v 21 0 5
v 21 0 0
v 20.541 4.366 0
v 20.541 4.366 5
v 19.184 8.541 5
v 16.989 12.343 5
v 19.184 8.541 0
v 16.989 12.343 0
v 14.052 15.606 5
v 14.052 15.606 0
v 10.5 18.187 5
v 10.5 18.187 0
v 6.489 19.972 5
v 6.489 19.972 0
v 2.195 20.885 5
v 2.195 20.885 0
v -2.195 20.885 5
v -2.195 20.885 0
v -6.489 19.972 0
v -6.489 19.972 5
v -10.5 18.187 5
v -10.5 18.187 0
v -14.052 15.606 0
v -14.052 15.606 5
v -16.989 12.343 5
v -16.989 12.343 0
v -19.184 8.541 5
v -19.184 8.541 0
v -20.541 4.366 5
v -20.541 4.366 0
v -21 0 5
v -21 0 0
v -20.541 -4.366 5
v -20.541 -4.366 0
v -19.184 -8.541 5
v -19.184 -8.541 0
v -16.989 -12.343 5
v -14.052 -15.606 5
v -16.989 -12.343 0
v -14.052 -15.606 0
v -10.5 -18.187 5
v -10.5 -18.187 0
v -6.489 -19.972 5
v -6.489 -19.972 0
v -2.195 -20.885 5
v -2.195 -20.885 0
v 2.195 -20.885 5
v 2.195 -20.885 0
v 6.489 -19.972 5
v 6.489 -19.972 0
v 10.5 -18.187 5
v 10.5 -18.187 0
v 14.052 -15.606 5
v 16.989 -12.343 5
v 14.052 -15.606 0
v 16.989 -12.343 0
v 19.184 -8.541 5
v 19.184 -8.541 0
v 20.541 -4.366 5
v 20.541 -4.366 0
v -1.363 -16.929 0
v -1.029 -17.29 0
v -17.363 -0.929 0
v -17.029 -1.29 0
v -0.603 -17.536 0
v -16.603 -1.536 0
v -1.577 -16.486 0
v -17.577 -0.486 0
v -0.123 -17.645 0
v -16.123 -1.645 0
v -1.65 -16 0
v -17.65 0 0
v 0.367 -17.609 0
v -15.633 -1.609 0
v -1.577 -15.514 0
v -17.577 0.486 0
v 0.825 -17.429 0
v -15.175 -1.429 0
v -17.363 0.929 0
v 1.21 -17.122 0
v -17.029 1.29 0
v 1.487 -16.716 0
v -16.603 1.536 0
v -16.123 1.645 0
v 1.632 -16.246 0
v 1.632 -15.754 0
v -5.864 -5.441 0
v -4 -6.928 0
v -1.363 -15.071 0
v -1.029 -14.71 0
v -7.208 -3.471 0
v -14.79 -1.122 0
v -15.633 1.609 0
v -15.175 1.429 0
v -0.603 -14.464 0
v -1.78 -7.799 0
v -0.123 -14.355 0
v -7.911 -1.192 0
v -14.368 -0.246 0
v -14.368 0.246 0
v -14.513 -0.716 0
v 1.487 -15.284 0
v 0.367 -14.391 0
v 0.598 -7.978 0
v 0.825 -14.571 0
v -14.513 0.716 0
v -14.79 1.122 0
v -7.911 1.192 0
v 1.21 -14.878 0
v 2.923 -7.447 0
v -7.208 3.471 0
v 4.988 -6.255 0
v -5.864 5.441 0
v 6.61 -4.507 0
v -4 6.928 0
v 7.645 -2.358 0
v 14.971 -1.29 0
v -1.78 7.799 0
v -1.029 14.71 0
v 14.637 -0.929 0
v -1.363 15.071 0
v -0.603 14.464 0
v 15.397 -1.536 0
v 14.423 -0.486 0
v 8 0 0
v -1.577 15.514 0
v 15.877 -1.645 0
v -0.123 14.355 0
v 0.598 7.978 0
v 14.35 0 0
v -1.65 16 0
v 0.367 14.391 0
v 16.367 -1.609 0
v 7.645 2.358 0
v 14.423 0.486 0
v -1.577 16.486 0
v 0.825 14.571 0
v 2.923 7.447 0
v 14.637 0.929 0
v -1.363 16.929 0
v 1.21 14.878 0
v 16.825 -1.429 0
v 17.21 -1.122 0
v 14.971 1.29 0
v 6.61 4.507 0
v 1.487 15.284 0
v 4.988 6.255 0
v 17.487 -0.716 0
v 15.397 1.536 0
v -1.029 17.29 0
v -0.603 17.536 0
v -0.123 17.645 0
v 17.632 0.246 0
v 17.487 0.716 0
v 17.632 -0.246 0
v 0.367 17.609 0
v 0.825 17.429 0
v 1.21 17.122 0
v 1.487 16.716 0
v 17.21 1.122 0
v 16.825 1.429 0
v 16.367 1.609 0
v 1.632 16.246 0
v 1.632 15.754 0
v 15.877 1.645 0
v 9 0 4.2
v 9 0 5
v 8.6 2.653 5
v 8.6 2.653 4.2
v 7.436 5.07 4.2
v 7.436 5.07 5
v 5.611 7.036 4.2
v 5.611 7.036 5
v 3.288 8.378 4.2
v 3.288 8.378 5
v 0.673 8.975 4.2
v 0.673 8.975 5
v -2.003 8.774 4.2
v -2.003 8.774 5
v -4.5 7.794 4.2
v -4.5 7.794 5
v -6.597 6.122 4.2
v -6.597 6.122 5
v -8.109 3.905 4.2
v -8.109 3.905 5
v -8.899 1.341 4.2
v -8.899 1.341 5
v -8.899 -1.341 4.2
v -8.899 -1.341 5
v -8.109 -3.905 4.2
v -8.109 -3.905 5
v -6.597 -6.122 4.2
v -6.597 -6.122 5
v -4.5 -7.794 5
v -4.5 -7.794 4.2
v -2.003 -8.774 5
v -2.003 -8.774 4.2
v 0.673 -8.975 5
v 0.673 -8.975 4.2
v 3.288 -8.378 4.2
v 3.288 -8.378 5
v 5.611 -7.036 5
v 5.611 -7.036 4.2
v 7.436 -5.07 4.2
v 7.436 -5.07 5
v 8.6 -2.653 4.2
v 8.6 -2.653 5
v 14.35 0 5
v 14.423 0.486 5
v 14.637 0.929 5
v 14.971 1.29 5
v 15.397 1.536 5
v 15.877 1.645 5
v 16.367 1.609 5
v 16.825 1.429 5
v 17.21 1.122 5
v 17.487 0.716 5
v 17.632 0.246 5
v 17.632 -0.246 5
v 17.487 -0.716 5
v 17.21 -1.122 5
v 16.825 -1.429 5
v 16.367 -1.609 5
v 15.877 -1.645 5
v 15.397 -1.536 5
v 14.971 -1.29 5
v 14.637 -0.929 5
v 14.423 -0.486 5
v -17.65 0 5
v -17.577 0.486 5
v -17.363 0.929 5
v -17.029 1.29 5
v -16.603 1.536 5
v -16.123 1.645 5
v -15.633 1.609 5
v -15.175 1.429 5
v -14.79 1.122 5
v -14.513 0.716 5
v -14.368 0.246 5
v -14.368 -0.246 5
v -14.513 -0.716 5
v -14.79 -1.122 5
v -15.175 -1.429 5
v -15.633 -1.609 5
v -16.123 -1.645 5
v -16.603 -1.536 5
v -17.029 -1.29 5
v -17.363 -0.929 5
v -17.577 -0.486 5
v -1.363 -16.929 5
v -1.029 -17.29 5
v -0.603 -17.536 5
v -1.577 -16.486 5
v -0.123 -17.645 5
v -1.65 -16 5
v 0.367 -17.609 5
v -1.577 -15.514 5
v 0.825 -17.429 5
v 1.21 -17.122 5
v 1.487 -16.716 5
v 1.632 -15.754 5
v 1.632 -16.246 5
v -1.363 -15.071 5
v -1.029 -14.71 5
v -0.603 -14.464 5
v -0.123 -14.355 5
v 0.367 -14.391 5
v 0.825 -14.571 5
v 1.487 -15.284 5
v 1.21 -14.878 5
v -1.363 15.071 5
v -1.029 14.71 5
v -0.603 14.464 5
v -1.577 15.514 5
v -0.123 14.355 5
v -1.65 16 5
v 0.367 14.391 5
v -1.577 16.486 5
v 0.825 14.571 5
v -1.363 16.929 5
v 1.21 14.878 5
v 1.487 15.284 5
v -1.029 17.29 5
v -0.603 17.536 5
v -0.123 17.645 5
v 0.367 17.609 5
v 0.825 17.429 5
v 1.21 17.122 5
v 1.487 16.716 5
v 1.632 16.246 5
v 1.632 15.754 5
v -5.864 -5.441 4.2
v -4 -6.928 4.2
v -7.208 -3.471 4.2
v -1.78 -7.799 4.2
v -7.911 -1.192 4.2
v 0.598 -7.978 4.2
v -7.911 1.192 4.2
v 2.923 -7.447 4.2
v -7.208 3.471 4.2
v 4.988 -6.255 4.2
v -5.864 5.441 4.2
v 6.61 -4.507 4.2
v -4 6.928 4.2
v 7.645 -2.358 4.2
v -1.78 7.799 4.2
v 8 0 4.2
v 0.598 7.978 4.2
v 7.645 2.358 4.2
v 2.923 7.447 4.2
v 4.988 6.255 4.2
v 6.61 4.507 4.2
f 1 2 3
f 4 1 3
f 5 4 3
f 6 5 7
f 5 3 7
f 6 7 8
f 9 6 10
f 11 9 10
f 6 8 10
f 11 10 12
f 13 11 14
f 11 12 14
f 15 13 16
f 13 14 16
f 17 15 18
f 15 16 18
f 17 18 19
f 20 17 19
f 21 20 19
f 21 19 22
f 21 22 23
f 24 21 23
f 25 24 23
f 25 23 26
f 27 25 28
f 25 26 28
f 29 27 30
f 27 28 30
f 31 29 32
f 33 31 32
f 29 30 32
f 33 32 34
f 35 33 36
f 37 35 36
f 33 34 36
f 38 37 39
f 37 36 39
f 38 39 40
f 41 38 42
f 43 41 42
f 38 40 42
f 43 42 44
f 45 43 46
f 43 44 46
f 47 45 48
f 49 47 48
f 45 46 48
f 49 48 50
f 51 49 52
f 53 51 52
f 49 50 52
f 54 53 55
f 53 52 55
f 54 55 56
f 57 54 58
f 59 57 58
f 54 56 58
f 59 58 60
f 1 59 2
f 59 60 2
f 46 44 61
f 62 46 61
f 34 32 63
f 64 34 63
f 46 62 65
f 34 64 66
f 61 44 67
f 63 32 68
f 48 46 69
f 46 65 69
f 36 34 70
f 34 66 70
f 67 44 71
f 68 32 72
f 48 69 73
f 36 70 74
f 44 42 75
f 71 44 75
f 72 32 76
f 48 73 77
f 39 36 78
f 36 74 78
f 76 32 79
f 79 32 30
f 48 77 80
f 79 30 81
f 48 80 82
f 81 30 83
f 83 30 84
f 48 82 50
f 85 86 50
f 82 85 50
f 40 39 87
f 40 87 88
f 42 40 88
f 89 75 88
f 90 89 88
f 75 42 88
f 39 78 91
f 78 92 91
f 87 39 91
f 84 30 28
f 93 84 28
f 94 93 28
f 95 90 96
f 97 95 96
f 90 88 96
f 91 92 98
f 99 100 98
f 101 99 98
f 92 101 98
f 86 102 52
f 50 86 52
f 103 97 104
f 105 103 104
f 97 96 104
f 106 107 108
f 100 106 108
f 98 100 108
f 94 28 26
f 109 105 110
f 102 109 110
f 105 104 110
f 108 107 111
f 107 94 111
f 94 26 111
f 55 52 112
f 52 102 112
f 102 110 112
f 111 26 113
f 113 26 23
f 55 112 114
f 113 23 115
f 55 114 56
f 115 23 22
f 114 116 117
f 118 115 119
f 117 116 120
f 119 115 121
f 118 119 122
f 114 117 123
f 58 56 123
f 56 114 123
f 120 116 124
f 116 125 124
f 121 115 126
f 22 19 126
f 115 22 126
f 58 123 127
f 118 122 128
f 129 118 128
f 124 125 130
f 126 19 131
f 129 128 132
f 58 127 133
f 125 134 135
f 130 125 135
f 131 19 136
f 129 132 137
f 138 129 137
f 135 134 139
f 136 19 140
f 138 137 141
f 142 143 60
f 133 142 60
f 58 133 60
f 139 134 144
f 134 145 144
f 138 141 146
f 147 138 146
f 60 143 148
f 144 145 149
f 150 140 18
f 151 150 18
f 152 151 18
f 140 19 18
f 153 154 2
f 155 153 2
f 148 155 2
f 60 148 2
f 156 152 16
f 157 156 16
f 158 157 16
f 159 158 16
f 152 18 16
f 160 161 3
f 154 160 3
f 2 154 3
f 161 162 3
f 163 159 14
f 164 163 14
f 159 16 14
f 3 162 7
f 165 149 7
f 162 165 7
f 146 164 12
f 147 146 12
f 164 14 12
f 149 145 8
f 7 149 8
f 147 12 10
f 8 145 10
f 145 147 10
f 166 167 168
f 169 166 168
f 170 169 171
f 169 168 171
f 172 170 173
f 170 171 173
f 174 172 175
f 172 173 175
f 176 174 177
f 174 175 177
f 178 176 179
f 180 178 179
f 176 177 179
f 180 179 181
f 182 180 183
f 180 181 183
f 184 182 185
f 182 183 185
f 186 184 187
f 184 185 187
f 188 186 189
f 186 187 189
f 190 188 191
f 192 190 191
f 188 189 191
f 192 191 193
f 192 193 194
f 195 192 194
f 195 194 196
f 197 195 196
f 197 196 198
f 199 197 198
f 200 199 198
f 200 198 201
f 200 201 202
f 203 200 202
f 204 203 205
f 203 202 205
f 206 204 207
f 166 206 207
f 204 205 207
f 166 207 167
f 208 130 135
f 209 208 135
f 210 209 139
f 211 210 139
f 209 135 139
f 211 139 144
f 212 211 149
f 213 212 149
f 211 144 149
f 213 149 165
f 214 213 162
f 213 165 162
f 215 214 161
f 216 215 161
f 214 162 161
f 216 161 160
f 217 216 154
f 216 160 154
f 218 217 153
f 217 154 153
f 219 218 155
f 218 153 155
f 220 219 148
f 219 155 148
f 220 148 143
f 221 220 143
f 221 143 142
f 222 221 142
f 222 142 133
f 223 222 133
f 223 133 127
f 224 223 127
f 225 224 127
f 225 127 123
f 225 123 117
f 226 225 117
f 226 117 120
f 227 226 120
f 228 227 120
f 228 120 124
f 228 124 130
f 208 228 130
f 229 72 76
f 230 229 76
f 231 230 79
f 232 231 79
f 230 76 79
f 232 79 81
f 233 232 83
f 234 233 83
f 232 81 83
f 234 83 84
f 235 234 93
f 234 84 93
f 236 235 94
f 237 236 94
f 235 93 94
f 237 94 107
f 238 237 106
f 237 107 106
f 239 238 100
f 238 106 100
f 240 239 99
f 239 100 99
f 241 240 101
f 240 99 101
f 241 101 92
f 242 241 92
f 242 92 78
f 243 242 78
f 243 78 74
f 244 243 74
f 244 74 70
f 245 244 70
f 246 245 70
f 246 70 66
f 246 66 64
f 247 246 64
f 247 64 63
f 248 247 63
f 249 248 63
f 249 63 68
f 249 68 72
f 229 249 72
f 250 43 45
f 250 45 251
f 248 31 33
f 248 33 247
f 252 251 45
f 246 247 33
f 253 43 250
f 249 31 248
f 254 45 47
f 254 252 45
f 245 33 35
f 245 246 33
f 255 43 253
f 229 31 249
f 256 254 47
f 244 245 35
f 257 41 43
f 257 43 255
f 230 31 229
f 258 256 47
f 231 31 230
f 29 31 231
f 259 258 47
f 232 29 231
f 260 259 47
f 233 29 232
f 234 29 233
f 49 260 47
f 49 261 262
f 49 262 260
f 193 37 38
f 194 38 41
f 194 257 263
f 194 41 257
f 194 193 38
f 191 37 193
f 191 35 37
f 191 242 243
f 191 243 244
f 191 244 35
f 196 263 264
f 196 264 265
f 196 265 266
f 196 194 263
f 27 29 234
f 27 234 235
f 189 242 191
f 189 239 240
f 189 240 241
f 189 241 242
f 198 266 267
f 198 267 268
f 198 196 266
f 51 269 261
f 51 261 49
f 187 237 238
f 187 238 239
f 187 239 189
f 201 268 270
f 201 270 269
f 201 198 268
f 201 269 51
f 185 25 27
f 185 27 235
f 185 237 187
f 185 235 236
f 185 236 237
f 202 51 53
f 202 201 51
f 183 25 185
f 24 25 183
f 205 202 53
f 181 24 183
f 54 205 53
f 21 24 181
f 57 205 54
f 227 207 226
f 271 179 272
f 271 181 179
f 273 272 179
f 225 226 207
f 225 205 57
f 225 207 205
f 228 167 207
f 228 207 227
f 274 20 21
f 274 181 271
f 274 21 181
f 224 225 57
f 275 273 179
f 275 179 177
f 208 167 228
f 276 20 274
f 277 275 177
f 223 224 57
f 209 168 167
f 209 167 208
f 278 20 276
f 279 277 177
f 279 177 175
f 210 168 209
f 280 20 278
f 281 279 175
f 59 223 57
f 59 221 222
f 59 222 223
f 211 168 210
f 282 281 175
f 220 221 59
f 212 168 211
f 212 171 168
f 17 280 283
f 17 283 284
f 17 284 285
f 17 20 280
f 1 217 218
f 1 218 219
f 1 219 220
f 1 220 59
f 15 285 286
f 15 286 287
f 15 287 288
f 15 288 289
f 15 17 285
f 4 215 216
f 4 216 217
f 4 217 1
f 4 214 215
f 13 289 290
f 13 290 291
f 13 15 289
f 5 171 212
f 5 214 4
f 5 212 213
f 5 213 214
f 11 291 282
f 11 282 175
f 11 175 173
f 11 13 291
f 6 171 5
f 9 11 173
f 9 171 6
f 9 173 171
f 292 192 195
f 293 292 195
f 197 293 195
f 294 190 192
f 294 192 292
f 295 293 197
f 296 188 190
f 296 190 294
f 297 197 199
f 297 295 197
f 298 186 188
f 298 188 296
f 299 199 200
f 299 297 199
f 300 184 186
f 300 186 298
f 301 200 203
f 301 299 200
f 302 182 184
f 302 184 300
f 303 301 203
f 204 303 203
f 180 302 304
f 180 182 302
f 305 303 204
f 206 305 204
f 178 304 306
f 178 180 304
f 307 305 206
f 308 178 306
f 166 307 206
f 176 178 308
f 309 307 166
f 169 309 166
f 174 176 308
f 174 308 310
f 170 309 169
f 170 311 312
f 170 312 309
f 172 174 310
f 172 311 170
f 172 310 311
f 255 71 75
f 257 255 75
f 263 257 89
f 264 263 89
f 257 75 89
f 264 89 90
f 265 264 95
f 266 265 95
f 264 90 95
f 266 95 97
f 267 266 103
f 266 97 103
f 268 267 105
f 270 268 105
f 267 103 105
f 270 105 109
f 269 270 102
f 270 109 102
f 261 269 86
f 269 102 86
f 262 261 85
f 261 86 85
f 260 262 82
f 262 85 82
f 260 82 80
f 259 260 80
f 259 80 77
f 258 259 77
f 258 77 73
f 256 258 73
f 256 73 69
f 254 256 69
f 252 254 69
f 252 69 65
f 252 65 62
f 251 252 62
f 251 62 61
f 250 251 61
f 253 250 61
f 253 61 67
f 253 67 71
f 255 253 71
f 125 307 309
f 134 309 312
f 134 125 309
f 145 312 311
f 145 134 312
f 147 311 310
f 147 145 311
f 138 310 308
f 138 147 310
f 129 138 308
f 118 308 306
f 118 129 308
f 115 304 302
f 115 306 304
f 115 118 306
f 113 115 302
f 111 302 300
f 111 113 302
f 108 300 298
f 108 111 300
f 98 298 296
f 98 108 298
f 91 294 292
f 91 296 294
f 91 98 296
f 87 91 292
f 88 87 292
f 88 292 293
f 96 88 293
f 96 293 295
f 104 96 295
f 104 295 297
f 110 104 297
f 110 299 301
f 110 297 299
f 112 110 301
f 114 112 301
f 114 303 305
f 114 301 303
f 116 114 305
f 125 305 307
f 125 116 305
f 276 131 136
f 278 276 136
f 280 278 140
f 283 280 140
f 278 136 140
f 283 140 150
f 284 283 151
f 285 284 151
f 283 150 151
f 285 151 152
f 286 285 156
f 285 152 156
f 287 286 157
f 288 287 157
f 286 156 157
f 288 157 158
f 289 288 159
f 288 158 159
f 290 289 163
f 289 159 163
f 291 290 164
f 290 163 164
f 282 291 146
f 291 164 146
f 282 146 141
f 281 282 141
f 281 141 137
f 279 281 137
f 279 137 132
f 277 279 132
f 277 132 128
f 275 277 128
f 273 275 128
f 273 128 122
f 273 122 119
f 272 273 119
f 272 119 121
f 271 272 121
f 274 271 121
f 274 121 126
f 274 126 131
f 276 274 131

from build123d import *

# Parameters (mm, degrees)
SKETCH_1_R          = 21
SKETCH_1_R_2        = 8
EXTRUDE_1_DEPTH     = 5
M4X0_71_D           = 3.3
SKETCH_4_R          = 9
CUT_EXTRUDE_1_DEPTH = 0.8


with BuildPart() as part:
    # Эскиз1 → Бобышка-Вытянуть1 (new body)
    with BuildSketch(Plane.XY):
        Circle(SKETCH_1_R)
        Circle(SKETCH_1_R_2, mode=Mode.SUBTRACT)
    extrude(amount=EXTRUDE_1_DEPTH)

    # Отверстие обработанное метчиком M4x0.71 (through all)
    with Locations(Plane.XY.offset(5)):
        with Locations((0, 16), (-16, 0), (0, -16), (16, 0)):
            Hole(M4X0_71_D / 2)

    # Эскиз4 → Вырез-Вытянуть1 (cut)
    with BuildSketch(Plane.XY.offset(5)):
        Circle(SKETCH_4_R)
    extrude(amount=-CUT_EXTRUDE_1_DEPTH, mode=Mode.SUBTRACT)


solid = part.part
